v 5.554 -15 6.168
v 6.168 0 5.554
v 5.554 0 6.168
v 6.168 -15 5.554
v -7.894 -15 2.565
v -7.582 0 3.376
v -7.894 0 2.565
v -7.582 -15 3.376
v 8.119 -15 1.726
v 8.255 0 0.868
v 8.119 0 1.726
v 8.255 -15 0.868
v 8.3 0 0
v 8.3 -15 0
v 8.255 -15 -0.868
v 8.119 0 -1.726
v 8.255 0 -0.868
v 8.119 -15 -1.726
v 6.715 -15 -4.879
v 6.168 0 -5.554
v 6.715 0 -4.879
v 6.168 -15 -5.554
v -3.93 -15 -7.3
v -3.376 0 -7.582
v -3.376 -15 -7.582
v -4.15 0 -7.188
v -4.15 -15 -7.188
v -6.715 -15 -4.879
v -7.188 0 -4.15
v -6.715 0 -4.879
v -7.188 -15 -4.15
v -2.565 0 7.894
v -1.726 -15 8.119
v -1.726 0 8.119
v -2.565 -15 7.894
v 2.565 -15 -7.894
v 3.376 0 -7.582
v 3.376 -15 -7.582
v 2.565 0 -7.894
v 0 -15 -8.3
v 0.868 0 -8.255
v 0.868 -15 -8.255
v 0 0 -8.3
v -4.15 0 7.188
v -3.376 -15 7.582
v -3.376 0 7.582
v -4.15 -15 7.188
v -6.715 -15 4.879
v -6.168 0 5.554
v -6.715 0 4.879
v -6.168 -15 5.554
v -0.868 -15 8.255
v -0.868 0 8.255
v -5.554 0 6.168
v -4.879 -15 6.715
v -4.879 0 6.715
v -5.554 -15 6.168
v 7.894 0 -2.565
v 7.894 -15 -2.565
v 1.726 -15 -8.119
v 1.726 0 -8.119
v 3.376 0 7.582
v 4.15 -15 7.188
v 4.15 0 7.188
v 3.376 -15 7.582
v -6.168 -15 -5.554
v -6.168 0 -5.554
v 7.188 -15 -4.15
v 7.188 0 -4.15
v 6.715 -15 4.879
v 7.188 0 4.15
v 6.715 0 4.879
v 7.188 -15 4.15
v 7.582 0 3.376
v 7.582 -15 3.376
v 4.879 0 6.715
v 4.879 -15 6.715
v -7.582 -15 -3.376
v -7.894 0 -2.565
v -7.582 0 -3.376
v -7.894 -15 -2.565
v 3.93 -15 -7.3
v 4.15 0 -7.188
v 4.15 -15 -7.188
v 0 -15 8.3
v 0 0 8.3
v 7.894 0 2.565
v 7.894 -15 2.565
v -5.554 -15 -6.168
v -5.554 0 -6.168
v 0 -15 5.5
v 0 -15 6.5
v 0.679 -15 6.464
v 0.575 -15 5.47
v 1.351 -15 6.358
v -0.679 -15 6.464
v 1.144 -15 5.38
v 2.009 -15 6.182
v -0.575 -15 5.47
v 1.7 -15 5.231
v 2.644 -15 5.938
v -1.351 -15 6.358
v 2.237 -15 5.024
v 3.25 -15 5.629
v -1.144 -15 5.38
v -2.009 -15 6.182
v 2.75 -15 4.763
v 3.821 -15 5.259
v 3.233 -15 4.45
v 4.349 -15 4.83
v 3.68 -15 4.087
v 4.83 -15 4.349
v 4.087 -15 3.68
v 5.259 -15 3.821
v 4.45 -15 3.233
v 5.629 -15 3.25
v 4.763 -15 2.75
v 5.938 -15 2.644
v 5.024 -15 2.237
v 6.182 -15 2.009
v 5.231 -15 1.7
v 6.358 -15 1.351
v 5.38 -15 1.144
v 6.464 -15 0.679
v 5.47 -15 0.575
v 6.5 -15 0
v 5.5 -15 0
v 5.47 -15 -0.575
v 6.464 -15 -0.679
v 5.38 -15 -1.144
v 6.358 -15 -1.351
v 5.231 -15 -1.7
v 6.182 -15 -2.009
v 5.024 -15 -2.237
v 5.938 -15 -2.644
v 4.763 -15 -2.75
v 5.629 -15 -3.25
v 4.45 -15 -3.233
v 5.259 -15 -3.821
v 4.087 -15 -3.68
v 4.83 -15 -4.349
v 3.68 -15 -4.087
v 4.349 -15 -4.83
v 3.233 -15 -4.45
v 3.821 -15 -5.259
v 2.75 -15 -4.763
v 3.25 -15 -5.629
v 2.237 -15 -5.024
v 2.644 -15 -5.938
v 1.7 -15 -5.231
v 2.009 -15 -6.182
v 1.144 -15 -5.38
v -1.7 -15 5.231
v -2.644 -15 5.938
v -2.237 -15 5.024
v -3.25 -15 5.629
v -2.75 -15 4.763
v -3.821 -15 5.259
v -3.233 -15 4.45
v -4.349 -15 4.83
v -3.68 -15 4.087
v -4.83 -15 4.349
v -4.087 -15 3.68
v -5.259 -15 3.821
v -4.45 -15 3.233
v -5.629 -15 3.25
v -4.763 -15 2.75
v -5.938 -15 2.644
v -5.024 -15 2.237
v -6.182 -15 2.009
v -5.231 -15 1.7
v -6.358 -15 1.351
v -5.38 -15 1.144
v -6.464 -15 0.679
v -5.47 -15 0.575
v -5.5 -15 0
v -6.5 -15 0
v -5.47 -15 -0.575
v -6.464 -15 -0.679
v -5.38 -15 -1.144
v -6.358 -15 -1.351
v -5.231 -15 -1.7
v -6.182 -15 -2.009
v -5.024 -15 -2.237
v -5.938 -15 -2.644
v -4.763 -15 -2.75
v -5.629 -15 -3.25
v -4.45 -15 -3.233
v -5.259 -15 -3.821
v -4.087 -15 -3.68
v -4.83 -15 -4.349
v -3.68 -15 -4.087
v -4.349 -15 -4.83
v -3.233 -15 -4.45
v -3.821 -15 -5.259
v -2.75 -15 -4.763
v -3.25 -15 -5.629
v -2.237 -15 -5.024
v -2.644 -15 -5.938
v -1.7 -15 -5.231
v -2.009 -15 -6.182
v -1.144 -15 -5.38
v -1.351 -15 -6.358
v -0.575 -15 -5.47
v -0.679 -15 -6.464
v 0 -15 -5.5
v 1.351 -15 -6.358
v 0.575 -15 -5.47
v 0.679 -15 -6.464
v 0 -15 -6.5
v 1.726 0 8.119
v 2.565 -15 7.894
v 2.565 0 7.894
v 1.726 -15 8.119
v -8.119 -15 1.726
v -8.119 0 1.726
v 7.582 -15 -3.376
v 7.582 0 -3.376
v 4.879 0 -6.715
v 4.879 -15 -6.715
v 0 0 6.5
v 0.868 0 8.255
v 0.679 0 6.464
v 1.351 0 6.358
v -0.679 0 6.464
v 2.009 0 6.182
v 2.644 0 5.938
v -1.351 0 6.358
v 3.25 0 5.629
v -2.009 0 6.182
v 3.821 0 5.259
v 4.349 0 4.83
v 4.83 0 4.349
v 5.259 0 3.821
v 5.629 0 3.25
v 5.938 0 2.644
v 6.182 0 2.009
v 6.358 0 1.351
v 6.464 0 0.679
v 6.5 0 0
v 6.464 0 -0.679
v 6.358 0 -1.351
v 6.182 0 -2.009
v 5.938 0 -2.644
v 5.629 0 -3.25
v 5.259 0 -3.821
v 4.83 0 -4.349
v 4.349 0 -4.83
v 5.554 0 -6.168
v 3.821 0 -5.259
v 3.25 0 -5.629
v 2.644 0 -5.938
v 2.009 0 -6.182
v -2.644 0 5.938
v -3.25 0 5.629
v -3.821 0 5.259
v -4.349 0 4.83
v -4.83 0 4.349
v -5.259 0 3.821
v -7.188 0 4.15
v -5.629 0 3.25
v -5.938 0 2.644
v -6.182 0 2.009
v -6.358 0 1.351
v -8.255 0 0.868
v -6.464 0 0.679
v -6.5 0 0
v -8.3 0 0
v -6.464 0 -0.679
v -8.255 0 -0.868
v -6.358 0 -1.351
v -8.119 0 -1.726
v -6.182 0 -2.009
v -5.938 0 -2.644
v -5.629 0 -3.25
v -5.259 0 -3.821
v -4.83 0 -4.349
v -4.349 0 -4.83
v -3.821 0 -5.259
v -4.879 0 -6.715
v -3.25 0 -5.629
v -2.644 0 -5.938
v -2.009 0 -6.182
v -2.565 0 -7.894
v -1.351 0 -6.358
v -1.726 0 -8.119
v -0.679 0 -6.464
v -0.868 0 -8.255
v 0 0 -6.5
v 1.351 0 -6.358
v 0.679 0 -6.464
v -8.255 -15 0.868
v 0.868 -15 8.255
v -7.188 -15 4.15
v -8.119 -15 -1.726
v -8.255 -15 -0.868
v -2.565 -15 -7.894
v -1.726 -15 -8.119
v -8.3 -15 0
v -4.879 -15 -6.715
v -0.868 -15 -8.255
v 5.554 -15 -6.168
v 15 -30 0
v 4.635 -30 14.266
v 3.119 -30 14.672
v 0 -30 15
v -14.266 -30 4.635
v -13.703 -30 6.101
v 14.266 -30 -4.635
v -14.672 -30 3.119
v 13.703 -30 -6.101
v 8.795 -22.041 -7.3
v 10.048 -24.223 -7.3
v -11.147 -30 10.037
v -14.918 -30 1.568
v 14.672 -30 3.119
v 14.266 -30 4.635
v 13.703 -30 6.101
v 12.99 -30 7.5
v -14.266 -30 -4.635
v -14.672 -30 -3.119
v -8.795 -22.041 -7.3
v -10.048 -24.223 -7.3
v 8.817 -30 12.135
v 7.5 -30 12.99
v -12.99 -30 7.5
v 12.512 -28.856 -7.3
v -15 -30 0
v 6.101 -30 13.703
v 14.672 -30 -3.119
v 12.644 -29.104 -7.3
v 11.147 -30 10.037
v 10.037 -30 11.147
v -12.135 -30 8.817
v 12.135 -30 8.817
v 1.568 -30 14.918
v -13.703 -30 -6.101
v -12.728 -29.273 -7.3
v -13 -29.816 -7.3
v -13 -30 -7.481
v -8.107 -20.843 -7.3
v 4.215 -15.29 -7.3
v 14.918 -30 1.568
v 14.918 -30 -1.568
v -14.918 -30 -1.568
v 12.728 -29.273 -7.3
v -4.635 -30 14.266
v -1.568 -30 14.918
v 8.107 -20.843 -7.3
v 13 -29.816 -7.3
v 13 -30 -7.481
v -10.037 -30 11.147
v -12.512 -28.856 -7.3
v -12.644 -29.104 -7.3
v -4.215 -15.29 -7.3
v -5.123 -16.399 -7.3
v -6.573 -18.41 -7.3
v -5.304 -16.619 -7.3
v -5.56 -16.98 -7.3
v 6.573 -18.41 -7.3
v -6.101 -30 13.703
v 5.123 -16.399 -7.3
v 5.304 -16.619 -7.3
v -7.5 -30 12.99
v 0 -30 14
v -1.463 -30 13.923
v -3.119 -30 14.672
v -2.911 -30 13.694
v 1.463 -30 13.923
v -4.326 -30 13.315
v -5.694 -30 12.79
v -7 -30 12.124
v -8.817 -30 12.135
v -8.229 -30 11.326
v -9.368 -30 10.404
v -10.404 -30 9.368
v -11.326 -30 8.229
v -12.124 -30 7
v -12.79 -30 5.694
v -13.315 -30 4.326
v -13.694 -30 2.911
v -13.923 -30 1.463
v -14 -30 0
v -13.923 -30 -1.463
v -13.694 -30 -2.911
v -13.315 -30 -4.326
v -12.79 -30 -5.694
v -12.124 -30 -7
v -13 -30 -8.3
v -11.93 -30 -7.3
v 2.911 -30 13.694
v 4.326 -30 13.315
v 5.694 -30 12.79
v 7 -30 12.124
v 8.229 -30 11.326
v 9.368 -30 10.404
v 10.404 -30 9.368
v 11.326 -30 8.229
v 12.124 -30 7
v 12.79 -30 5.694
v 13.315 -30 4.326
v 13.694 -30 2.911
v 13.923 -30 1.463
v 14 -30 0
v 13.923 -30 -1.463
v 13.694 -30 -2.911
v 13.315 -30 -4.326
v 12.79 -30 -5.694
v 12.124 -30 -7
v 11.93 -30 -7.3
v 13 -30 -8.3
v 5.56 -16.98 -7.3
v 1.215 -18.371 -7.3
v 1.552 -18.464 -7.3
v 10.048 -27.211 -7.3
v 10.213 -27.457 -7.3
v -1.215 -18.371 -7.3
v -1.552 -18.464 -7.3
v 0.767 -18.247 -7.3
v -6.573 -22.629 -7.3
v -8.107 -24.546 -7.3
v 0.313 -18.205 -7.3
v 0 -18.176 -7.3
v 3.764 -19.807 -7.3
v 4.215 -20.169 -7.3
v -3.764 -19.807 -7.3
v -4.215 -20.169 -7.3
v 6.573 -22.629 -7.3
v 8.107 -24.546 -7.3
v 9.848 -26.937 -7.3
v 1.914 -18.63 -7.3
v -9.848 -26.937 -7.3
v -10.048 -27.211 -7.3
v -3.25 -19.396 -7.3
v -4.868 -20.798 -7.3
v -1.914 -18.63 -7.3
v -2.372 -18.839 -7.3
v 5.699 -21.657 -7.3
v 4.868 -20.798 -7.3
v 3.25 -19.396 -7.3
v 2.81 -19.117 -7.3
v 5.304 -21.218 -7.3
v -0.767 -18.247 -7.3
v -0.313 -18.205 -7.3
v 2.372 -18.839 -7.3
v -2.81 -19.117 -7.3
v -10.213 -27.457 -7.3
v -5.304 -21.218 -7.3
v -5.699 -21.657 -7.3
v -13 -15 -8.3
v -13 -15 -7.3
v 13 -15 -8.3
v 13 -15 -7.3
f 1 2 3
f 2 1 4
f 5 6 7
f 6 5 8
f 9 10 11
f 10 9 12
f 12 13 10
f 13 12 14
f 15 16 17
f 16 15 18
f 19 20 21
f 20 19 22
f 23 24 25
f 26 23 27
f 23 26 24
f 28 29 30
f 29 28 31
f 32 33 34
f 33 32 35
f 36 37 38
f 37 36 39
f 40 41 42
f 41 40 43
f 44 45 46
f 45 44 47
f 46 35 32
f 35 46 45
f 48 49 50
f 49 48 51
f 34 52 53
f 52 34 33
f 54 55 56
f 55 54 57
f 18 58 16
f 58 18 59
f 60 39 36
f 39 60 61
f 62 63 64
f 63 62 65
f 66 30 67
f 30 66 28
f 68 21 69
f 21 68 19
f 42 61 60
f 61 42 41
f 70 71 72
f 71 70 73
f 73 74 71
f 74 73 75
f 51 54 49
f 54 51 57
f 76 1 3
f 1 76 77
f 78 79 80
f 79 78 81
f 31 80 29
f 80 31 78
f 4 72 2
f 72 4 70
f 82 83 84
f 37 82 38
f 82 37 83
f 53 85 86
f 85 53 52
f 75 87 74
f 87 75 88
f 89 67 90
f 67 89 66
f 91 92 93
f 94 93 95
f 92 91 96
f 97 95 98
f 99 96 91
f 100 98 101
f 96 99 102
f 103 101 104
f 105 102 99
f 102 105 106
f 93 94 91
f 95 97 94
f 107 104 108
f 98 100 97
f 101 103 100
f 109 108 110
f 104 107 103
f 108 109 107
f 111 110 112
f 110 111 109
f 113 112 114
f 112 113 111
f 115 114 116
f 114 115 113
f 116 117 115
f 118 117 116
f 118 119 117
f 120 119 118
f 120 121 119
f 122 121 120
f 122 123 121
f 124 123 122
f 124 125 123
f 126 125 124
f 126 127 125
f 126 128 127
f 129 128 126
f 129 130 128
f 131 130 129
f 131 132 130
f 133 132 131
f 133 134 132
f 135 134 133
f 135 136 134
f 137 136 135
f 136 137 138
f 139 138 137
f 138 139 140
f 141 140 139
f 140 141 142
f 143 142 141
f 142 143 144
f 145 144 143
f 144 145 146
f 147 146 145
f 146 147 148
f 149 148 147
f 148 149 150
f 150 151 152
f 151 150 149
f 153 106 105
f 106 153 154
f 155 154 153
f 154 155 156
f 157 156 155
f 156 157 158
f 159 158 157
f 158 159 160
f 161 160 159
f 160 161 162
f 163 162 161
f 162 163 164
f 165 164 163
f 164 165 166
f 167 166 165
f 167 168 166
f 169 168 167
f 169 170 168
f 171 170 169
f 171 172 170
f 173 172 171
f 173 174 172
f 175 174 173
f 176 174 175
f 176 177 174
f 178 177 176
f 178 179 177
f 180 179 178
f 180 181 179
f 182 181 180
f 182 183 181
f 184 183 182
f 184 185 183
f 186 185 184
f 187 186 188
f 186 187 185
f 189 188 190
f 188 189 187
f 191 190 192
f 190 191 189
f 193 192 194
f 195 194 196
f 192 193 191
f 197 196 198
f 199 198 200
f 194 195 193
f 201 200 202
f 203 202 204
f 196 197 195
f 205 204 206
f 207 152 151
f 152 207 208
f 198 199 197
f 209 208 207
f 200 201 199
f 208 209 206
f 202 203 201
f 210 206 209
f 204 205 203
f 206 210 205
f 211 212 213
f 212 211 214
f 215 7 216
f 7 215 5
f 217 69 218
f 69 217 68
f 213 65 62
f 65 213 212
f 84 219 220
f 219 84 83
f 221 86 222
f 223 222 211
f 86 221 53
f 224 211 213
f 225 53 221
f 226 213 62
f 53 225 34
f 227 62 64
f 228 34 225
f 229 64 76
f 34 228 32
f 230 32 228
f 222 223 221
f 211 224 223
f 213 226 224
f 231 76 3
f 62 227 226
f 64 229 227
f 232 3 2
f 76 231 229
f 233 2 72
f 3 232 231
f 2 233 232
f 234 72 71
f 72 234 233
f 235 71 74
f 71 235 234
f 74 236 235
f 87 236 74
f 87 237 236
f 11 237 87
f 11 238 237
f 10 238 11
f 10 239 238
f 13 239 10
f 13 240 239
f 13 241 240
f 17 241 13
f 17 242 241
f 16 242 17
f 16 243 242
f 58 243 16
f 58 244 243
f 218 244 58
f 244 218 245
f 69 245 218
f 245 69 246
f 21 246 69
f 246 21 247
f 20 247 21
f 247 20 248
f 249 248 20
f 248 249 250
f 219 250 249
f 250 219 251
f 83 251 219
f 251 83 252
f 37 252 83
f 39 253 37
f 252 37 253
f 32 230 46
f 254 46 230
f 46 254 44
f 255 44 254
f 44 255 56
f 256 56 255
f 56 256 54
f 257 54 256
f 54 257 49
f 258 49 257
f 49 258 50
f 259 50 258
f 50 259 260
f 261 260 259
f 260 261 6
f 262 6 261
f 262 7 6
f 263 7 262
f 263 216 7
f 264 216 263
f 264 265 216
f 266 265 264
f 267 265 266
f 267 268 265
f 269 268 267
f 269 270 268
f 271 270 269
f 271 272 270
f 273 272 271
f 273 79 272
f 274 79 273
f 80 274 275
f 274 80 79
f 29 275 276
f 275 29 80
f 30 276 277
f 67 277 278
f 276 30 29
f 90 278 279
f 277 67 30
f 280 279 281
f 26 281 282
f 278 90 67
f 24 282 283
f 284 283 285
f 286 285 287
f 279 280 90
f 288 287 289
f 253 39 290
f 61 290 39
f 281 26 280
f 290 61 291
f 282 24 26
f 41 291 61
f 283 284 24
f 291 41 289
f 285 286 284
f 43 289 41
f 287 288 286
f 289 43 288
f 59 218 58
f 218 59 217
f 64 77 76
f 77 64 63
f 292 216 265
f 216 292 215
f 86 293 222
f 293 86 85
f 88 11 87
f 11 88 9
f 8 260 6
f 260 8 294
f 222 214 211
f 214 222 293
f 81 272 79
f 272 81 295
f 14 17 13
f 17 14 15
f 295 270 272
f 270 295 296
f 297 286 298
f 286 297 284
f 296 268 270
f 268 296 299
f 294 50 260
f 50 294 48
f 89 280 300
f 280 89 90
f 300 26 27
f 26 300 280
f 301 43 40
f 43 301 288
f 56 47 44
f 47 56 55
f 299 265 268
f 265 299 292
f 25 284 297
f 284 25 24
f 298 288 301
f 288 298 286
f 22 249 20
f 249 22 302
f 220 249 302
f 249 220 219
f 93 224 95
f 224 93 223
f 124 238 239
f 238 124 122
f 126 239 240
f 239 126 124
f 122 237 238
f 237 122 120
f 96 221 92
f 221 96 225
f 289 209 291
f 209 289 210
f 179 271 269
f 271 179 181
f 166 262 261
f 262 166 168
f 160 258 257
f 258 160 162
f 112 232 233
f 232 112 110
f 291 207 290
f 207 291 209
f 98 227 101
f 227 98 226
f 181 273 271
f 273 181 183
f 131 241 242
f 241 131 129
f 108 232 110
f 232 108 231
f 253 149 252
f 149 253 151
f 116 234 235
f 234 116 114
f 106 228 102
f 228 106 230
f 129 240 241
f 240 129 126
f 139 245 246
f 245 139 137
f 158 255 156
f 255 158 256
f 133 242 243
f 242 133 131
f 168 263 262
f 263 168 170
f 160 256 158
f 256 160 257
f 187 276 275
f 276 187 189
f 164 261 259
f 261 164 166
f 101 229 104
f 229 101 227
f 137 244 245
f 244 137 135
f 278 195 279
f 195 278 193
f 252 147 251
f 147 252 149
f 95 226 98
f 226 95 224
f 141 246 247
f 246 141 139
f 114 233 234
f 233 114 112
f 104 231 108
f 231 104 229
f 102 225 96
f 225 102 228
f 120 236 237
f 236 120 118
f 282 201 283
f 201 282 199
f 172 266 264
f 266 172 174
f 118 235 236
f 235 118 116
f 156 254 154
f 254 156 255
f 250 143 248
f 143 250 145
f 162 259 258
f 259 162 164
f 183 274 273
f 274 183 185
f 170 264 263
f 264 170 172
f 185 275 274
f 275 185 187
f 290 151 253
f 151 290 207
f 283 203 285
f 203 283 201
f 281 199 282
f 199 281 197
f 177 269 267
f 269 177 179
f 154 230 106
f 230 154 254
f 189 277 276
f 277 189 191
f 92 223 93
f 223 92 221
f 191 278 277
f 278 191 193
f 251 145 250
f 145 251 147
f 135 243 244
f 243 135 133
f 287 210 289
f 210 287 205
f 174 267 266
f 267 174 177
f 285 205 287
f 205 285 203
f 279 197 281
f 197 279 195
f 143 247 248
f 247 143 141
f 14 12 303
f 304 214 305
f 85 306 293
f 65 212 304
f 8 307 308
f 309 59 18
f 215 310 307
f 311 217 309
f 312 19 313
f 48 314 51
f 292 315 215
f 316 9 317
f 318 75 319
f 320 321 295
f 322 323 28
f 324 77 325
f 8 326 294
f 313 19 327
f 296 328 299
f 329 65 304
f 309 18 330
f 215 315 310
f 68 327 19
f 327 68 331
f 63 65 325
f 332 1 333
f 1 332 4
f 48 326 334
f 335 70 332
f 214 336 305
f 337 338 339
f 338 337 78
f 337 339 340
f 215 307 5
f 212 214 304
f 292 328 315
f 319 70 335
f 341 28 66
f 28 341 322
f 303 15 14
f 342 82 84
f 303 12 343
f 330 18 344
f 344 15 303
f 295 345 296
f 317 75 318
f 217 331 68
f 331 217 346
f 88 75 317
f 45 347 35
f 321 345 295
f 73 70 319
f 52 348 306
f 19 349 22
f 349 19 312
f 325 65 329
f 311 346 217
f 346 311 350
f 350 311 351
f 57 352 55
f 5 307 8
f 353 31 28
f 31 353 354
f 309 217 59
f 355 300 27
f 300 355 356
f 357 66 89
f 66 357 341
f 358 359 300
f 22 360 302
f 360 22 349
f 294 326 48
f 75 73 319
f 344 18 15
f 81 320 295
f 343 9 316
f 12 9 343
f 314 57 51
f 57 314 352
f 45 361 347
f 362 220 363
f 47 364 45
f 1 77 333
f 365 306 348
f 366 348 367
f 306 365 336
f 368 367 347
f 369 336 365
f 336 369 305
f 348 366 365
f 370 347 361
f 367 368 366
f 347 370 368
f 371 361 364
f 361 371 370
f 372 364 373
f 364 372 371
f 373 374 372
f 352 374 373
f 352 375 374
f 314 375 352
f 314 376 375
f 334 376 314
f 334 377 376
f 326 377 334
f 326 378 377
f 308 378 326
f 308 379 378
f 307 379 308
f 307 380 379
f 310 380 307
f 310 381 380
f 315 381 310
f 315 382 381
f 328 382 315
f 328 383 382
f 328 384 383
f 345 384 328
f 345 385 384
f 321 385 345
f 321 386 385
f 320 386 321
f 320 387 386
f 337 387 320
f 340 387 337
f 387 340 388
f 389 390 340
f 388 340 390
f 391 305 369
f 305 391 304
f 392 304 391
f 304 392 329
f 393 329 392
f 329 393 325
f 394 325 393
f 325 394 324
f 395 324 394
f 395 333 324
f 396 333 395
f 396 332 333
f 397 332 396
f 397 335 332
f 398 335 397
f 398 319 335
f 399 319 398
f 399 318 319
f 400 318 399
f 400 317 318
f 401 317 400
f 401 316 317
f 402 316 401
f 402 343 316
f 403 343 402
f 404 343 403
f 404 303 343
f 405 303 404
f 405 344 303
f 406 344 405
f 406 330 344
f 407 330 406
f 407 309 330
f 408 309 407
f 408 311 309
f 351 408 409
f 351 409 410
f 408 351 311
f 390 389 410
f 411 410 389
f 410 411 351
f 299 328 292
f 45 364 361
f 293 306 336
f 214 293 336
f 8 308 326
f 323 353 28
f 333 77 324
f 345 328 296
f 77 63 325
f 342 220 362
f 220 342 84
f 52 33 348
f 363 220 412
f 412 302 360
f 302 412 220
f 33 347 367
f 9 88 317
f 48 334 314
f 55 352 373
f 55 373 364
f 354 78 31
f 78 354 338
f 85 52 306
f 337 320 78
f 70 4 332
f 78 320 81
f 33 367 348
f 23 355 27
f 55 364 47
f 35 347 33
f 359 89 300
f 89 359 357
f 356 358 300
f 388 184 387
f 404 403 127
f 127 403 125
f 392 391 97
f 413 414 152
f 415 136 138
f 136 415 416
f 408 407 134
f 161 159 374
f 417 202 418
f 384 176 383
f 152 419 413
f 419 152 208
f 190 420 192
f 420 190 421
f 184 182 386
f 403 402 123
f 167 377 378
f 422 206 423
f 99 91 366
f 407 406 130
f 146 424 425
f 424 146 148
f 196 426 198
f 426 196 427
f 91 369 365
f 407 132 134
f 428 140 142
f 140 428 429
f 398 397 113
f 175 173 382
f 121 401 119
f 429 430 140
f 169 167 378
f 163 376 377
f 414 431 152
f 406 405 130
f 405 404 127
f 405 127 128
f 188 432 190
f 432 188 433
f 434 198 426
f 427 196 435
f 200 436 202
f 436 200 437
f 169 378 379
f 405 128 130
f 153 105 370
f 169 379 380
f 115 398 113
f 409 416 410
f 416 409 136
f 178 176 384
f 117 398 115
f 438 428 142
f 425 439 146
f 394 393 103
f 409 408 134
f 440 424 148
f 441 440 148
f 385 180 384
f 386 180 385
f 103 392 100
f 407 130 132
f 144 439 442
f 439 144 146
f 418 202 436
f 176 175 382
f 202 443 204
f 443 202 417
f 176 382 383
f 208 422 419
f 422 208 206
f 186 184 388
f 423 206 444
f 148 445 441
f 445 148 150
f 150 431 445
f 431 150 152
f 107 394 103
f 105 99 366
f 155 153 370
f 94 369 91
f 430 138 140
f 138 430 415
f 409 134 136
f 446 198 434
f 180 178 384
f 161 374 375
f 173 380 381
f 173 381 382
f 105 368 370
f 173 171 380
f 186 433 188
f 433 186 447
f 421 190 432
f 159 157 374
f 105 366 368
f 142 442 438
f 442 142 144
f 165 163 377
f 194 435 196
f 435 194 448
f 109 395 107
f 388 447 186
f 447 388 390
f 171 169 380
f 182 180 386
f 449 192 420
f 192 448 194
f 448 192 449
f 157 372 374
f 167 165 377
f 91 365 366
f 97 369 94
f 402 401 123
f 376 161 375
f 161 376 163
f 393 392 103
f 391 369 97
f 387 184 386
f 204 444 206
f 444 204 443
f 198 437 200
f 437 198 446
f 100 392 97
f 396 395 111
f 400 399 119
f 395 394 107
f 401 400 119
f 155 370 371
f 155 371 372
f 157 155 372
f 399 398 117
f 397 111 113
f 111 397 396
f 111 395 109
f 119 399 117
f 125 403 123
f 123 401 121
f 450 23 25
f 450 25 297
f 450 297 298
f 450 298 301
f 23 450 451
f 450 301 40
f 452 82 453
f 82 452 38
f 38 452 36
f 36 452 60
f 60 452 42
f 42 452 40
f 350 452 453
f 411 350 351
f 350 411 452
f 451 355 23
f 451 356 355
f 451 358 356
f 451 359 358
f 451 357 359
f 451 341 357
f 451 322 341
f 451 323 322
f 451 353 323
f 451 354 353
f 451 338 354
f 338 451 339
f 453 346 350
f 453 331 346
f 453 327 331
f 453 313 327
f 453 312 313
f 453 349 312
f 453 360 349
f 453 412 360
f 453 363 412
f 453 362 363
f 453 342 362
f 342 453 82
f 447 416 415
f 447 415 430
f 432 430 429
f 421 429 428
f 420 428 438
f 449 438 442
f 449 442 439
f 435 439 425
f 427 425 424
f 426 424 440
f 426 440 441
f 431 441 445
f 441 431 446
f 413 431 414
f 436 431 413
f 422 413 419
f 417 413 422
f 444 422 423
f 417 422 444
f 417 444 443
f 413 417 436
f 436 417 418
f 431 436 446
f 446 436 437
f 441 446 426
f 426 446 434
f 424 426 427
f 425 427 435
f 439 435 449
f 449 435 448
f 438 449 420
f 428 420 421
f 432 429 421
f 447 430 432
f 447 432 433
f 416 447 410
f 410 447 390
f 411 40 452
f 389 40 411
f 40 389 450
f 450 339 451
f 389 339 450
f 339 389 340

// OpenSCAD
difference()
{
rotate([90,0,0])
union()
{
translate([0,0,0])
difference()
{
cylinder(h=15,d=16.6,$fn=60);
cylinder(h=15,d=13,$fn=60);
}

translate([0,0,15])
difference()
{
cylinder(h=15,r1=8.3,r2=15,$fn=60);
cylinder(h=15,r1=5.5,r2=14,$fn=60);
}
}

translate([-13,-35,-38.4])cube([50,20,30.5]);
}
translate([-13,-30,-8.3])cube([26,15,1]);
